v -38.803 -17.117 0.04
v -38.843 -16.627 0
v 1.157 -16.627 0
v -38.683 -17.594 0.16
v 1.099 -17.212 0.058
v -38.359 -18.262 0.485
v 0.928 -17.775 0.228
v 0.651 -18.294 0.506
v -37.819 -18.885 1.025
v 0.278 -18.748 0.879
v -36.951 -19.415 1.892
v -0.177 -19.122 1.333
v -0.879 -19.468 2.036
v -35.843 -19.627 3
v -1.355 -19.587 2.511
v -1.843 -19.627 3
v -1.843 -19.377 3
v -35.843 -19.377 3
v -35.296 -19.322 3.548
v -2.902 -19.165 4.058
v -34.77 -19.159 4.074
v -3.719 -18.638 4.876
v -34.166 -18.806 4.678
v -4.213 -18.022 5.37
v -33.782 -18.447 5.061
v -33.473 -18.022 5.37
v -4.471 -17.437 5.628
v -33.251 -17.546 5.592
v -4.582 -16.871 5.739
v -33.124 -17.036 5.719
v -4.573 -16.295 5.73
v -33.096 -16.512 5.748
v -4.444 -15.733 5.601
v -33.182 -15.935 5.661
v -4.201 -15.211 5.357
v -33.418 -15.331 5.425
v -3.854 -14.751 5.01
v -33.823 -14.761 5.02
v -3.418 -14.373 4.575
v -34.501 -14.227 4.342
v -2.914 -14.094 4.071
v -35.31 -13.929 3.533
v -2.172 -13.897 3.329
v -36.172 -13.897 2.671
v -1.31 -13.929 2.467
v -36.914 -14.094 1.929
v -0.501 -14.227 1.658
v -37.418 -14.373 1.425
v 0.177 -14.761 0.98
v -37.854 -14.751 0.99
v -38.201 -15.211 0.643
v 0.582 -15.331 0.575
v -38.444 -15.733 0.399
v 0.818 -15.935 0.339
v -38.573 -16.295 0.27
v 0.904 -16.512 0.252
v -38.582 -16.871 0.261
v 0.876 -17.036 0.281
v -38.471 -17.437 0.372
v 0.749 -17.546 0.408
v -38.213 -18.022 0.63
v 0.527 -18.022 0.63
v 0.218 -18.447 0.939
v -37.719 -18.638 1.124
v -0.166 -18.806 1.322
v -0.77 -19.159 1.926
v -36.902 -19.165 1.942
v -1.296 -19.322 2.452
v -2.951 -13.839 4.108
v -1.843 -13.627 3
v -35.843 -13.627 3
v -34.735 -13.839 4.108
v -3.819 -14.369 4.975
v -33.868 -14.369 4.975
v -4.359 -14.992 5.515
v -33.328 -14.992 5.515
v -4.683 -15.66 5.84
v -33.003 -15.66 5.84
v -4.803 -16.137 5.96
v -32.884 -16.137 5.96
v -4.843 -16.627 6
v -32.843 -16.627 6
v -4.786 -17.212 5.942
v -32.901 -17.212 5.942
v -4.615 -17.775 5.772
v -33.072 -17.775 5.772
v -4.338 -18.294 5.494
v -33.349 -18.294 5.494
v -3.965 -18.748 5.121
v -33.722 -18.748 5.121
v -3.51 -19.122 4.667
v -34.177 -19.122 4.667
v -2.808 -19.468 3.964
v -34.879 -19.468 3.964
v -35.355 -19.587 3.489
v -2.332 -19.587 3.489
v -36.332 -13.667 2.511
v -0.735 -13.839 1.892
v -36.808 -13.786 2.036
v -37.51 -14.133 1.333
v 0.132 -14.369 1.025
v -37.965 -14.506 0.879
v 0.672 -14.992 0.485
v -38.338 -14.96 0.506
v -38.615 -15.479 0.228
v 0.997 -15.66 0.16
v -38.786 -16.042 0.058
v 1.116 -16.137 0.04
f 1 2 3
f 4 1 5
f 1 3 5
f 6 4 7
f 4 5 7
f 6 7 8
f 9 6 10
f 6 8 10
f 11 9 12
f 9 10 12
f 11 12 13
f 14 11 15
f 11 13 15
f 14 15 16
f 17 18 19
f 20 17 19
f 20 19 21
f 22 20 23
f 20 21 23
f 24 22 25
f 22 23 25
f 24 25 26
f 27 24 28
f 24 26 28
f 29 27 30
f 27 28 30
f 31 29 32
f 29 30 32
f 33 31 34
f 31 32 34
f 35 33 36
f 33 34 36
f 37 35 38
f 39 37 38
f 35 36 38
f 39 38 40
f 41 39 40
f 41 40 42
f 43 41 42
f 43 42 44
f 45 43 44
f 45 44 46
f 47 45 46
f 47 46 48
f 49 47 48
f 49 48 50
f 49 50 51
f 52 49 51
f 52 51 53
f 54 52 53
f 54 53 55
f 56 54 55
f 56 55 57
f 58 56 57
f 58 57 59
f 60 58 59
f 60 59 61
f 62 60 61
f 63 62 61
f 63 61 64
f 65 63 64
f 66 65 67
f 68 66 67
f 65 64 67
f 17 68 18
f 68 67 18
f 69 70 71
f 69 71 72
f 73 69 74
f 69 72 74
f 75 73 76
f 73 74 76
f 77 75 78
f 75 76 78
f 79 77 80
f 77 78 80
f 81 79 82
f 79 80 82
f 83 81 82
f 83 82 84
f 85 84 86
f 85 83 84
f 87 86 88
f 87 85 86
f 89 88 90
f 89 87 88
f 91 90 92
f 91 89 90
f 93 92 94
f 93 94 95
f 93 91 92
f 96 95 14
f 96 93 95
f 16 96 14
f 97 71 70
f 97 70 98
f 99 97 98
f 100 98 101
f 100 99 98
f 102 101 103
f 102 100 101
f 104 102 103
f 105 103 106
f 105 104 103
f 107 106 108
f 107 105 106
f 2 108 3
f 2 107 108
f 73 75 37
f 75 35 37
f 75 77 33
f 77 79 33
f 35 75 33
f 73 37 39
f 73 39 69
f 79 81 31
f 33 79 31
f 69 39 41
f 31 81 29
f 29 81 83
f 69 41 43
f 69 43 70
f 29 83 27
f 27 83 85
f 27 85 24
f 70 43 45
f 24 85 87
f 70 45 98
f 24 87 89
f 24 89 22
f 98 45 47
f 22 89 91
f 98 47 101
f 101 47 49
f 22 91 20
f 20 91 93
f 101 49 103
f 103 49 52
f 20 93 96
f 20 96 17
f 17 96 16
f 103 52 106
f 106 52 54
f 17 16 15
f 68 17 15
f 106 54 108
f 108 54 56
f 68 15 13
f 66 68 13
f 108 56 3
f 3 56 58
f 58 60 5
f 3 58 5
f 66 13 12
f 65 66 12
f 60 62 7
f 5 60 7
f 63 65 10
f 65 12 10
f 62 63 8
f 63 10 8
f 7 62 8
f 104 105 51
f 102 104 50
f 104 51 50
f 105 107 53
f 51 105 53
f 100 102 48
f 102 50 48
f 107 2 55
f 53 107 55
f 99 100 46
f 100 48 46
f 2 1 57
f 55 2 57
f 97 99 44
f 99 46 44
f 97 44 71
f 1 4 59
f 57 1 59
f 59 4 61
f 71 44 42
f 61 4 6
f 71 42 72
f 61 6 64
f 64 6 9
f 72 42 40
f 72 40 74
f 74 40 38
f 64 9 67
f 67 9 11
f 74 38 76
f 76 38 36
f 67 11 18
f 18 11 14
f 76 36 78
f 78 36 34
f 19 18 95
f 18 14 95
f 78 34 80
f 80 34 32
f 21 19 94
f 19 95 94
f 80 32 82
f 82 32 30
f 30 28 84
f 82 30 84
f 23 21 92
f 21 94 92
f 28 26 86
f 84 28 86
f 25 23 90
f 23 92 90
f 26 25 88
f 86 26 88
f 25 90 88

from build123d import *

# Parameters (mm, degrees)
F1_DEPTH = 6
F3_DEPTH = 6.001
F4_R     = 2.75
F5_DEPTH = 40.001
F6_R     = 2.99999
F7_DEPTH = 6.001


# Not quite as in the source:
# - a fillet or chamfer is up to 0.001 mm smaller than in the source, because OpenCascade refuses the exact size


with BuildPart() as f1:
    # F0 (on Top) → F1 (new body)
    with BuildSketch(Plane.XY):
        with BuildLine():
            Line((-8.5178157315, -13.6271222085), (-38.8432986429, -13.6271222085))
            Line((-38.8432986429, -13.6271222085), (-38.8432986429, -19.6271222085))
            Line((-38.8432986429, -19.6271222085), (-8.5178157315, -19.6271222085))
            ThreePointArc((-8.5178157315, -19.6271222085), (-11.5178157315, -16.6271222085), (-8.5178157315, -13.6271222085))
        make_face()
        with BuildLine():
            Line((1.1567013571, -13.6271222085), (-8.5178157315, -13.6271222085))
            ThreePointArc((-8.5178157315, -13.6271222085), (-6.3964953879, -14.5058018649), (-5.5178157315, -16.6271222085))
            ThreePointArc((-5.5178157315, -16.6271222085), (-6.3964953879, -18.748442552), (-8.5178157315, -19.6271222085))
            Line((-8.5178157315, -19.6271222085), (1.1567013571, -19.6271222085))
            Line((1.1567013571, -19.6271222085), (1.1567013571, -13.6271222085))
        make_face()
        with BuildLine():
            ThreePointArc((-5.5178157315, -16.6271222085), (-6.3964953879, -14.5058018649), (-8.5178157315, -13.6271222085))
            ThreePointArc((-8.5178157315, -13.6271222085), (-11.5178157315, -16.6271222085), (-8.5178157315, -19.6271222085))
            ThreePointArc((-8.5178157315, -19.6271222085), (-6.3964953879, -18.748442552), (-5.5178157315, -16.6271222085))
        make_face()
    extrude(amount=F1_DEPTH)

    # F2 (on face) → F3 (cut, through all)
    with BuildSketch(Plane.XZ.offset(19.6271222085)):
        Polygon((1.1567013571, 6), (-4.8432986429, 6), (1.1567013571, 0), align=None)
    extrude(amount=-F3_DEPTH, mode=Mode.SUBTRACT)

    # F4 (on face) → F5 (cut, through all)
    with BuildSketch(Plane(origin=(-38.8432986429, 0, 0), x_dir=(0, -1, 0), z_dir=(-1, 0, 0))):
        with Locations((16.6271222085, 3)):
            Circle(F4_R)
    extrude(amount=-F5_DEPTH, mode=Mode.SUBTRACT)

    # F6 (radius 3 in the source; OpenCascade refuses exactly that, so slightly less here)
    f6_edges = [f1.edges().sort_by_distance(p)[0] for p in [
        (-21.843299, -19.627122, 6),
        (-21.843299, -13.627122, 6),
        (-18.843299, -13.627122, 0),
        (-18.843299, -19.627122, 0),
    ]]
    fillet(f6_edges, radius=F6_R)

    # F2 (on face) → F7 (cut, through all)
    with BuildSketch(Plane.XZ.offset(19.6271222085)):
        Polygon((-38.8432986429, 0), (-32.8432986429, 6), (-38.8432986429, 6), align=None)
    extrude(amount=-F7_DEPTH, mode=Mode.SUBTRACT)


solid = f1.part
